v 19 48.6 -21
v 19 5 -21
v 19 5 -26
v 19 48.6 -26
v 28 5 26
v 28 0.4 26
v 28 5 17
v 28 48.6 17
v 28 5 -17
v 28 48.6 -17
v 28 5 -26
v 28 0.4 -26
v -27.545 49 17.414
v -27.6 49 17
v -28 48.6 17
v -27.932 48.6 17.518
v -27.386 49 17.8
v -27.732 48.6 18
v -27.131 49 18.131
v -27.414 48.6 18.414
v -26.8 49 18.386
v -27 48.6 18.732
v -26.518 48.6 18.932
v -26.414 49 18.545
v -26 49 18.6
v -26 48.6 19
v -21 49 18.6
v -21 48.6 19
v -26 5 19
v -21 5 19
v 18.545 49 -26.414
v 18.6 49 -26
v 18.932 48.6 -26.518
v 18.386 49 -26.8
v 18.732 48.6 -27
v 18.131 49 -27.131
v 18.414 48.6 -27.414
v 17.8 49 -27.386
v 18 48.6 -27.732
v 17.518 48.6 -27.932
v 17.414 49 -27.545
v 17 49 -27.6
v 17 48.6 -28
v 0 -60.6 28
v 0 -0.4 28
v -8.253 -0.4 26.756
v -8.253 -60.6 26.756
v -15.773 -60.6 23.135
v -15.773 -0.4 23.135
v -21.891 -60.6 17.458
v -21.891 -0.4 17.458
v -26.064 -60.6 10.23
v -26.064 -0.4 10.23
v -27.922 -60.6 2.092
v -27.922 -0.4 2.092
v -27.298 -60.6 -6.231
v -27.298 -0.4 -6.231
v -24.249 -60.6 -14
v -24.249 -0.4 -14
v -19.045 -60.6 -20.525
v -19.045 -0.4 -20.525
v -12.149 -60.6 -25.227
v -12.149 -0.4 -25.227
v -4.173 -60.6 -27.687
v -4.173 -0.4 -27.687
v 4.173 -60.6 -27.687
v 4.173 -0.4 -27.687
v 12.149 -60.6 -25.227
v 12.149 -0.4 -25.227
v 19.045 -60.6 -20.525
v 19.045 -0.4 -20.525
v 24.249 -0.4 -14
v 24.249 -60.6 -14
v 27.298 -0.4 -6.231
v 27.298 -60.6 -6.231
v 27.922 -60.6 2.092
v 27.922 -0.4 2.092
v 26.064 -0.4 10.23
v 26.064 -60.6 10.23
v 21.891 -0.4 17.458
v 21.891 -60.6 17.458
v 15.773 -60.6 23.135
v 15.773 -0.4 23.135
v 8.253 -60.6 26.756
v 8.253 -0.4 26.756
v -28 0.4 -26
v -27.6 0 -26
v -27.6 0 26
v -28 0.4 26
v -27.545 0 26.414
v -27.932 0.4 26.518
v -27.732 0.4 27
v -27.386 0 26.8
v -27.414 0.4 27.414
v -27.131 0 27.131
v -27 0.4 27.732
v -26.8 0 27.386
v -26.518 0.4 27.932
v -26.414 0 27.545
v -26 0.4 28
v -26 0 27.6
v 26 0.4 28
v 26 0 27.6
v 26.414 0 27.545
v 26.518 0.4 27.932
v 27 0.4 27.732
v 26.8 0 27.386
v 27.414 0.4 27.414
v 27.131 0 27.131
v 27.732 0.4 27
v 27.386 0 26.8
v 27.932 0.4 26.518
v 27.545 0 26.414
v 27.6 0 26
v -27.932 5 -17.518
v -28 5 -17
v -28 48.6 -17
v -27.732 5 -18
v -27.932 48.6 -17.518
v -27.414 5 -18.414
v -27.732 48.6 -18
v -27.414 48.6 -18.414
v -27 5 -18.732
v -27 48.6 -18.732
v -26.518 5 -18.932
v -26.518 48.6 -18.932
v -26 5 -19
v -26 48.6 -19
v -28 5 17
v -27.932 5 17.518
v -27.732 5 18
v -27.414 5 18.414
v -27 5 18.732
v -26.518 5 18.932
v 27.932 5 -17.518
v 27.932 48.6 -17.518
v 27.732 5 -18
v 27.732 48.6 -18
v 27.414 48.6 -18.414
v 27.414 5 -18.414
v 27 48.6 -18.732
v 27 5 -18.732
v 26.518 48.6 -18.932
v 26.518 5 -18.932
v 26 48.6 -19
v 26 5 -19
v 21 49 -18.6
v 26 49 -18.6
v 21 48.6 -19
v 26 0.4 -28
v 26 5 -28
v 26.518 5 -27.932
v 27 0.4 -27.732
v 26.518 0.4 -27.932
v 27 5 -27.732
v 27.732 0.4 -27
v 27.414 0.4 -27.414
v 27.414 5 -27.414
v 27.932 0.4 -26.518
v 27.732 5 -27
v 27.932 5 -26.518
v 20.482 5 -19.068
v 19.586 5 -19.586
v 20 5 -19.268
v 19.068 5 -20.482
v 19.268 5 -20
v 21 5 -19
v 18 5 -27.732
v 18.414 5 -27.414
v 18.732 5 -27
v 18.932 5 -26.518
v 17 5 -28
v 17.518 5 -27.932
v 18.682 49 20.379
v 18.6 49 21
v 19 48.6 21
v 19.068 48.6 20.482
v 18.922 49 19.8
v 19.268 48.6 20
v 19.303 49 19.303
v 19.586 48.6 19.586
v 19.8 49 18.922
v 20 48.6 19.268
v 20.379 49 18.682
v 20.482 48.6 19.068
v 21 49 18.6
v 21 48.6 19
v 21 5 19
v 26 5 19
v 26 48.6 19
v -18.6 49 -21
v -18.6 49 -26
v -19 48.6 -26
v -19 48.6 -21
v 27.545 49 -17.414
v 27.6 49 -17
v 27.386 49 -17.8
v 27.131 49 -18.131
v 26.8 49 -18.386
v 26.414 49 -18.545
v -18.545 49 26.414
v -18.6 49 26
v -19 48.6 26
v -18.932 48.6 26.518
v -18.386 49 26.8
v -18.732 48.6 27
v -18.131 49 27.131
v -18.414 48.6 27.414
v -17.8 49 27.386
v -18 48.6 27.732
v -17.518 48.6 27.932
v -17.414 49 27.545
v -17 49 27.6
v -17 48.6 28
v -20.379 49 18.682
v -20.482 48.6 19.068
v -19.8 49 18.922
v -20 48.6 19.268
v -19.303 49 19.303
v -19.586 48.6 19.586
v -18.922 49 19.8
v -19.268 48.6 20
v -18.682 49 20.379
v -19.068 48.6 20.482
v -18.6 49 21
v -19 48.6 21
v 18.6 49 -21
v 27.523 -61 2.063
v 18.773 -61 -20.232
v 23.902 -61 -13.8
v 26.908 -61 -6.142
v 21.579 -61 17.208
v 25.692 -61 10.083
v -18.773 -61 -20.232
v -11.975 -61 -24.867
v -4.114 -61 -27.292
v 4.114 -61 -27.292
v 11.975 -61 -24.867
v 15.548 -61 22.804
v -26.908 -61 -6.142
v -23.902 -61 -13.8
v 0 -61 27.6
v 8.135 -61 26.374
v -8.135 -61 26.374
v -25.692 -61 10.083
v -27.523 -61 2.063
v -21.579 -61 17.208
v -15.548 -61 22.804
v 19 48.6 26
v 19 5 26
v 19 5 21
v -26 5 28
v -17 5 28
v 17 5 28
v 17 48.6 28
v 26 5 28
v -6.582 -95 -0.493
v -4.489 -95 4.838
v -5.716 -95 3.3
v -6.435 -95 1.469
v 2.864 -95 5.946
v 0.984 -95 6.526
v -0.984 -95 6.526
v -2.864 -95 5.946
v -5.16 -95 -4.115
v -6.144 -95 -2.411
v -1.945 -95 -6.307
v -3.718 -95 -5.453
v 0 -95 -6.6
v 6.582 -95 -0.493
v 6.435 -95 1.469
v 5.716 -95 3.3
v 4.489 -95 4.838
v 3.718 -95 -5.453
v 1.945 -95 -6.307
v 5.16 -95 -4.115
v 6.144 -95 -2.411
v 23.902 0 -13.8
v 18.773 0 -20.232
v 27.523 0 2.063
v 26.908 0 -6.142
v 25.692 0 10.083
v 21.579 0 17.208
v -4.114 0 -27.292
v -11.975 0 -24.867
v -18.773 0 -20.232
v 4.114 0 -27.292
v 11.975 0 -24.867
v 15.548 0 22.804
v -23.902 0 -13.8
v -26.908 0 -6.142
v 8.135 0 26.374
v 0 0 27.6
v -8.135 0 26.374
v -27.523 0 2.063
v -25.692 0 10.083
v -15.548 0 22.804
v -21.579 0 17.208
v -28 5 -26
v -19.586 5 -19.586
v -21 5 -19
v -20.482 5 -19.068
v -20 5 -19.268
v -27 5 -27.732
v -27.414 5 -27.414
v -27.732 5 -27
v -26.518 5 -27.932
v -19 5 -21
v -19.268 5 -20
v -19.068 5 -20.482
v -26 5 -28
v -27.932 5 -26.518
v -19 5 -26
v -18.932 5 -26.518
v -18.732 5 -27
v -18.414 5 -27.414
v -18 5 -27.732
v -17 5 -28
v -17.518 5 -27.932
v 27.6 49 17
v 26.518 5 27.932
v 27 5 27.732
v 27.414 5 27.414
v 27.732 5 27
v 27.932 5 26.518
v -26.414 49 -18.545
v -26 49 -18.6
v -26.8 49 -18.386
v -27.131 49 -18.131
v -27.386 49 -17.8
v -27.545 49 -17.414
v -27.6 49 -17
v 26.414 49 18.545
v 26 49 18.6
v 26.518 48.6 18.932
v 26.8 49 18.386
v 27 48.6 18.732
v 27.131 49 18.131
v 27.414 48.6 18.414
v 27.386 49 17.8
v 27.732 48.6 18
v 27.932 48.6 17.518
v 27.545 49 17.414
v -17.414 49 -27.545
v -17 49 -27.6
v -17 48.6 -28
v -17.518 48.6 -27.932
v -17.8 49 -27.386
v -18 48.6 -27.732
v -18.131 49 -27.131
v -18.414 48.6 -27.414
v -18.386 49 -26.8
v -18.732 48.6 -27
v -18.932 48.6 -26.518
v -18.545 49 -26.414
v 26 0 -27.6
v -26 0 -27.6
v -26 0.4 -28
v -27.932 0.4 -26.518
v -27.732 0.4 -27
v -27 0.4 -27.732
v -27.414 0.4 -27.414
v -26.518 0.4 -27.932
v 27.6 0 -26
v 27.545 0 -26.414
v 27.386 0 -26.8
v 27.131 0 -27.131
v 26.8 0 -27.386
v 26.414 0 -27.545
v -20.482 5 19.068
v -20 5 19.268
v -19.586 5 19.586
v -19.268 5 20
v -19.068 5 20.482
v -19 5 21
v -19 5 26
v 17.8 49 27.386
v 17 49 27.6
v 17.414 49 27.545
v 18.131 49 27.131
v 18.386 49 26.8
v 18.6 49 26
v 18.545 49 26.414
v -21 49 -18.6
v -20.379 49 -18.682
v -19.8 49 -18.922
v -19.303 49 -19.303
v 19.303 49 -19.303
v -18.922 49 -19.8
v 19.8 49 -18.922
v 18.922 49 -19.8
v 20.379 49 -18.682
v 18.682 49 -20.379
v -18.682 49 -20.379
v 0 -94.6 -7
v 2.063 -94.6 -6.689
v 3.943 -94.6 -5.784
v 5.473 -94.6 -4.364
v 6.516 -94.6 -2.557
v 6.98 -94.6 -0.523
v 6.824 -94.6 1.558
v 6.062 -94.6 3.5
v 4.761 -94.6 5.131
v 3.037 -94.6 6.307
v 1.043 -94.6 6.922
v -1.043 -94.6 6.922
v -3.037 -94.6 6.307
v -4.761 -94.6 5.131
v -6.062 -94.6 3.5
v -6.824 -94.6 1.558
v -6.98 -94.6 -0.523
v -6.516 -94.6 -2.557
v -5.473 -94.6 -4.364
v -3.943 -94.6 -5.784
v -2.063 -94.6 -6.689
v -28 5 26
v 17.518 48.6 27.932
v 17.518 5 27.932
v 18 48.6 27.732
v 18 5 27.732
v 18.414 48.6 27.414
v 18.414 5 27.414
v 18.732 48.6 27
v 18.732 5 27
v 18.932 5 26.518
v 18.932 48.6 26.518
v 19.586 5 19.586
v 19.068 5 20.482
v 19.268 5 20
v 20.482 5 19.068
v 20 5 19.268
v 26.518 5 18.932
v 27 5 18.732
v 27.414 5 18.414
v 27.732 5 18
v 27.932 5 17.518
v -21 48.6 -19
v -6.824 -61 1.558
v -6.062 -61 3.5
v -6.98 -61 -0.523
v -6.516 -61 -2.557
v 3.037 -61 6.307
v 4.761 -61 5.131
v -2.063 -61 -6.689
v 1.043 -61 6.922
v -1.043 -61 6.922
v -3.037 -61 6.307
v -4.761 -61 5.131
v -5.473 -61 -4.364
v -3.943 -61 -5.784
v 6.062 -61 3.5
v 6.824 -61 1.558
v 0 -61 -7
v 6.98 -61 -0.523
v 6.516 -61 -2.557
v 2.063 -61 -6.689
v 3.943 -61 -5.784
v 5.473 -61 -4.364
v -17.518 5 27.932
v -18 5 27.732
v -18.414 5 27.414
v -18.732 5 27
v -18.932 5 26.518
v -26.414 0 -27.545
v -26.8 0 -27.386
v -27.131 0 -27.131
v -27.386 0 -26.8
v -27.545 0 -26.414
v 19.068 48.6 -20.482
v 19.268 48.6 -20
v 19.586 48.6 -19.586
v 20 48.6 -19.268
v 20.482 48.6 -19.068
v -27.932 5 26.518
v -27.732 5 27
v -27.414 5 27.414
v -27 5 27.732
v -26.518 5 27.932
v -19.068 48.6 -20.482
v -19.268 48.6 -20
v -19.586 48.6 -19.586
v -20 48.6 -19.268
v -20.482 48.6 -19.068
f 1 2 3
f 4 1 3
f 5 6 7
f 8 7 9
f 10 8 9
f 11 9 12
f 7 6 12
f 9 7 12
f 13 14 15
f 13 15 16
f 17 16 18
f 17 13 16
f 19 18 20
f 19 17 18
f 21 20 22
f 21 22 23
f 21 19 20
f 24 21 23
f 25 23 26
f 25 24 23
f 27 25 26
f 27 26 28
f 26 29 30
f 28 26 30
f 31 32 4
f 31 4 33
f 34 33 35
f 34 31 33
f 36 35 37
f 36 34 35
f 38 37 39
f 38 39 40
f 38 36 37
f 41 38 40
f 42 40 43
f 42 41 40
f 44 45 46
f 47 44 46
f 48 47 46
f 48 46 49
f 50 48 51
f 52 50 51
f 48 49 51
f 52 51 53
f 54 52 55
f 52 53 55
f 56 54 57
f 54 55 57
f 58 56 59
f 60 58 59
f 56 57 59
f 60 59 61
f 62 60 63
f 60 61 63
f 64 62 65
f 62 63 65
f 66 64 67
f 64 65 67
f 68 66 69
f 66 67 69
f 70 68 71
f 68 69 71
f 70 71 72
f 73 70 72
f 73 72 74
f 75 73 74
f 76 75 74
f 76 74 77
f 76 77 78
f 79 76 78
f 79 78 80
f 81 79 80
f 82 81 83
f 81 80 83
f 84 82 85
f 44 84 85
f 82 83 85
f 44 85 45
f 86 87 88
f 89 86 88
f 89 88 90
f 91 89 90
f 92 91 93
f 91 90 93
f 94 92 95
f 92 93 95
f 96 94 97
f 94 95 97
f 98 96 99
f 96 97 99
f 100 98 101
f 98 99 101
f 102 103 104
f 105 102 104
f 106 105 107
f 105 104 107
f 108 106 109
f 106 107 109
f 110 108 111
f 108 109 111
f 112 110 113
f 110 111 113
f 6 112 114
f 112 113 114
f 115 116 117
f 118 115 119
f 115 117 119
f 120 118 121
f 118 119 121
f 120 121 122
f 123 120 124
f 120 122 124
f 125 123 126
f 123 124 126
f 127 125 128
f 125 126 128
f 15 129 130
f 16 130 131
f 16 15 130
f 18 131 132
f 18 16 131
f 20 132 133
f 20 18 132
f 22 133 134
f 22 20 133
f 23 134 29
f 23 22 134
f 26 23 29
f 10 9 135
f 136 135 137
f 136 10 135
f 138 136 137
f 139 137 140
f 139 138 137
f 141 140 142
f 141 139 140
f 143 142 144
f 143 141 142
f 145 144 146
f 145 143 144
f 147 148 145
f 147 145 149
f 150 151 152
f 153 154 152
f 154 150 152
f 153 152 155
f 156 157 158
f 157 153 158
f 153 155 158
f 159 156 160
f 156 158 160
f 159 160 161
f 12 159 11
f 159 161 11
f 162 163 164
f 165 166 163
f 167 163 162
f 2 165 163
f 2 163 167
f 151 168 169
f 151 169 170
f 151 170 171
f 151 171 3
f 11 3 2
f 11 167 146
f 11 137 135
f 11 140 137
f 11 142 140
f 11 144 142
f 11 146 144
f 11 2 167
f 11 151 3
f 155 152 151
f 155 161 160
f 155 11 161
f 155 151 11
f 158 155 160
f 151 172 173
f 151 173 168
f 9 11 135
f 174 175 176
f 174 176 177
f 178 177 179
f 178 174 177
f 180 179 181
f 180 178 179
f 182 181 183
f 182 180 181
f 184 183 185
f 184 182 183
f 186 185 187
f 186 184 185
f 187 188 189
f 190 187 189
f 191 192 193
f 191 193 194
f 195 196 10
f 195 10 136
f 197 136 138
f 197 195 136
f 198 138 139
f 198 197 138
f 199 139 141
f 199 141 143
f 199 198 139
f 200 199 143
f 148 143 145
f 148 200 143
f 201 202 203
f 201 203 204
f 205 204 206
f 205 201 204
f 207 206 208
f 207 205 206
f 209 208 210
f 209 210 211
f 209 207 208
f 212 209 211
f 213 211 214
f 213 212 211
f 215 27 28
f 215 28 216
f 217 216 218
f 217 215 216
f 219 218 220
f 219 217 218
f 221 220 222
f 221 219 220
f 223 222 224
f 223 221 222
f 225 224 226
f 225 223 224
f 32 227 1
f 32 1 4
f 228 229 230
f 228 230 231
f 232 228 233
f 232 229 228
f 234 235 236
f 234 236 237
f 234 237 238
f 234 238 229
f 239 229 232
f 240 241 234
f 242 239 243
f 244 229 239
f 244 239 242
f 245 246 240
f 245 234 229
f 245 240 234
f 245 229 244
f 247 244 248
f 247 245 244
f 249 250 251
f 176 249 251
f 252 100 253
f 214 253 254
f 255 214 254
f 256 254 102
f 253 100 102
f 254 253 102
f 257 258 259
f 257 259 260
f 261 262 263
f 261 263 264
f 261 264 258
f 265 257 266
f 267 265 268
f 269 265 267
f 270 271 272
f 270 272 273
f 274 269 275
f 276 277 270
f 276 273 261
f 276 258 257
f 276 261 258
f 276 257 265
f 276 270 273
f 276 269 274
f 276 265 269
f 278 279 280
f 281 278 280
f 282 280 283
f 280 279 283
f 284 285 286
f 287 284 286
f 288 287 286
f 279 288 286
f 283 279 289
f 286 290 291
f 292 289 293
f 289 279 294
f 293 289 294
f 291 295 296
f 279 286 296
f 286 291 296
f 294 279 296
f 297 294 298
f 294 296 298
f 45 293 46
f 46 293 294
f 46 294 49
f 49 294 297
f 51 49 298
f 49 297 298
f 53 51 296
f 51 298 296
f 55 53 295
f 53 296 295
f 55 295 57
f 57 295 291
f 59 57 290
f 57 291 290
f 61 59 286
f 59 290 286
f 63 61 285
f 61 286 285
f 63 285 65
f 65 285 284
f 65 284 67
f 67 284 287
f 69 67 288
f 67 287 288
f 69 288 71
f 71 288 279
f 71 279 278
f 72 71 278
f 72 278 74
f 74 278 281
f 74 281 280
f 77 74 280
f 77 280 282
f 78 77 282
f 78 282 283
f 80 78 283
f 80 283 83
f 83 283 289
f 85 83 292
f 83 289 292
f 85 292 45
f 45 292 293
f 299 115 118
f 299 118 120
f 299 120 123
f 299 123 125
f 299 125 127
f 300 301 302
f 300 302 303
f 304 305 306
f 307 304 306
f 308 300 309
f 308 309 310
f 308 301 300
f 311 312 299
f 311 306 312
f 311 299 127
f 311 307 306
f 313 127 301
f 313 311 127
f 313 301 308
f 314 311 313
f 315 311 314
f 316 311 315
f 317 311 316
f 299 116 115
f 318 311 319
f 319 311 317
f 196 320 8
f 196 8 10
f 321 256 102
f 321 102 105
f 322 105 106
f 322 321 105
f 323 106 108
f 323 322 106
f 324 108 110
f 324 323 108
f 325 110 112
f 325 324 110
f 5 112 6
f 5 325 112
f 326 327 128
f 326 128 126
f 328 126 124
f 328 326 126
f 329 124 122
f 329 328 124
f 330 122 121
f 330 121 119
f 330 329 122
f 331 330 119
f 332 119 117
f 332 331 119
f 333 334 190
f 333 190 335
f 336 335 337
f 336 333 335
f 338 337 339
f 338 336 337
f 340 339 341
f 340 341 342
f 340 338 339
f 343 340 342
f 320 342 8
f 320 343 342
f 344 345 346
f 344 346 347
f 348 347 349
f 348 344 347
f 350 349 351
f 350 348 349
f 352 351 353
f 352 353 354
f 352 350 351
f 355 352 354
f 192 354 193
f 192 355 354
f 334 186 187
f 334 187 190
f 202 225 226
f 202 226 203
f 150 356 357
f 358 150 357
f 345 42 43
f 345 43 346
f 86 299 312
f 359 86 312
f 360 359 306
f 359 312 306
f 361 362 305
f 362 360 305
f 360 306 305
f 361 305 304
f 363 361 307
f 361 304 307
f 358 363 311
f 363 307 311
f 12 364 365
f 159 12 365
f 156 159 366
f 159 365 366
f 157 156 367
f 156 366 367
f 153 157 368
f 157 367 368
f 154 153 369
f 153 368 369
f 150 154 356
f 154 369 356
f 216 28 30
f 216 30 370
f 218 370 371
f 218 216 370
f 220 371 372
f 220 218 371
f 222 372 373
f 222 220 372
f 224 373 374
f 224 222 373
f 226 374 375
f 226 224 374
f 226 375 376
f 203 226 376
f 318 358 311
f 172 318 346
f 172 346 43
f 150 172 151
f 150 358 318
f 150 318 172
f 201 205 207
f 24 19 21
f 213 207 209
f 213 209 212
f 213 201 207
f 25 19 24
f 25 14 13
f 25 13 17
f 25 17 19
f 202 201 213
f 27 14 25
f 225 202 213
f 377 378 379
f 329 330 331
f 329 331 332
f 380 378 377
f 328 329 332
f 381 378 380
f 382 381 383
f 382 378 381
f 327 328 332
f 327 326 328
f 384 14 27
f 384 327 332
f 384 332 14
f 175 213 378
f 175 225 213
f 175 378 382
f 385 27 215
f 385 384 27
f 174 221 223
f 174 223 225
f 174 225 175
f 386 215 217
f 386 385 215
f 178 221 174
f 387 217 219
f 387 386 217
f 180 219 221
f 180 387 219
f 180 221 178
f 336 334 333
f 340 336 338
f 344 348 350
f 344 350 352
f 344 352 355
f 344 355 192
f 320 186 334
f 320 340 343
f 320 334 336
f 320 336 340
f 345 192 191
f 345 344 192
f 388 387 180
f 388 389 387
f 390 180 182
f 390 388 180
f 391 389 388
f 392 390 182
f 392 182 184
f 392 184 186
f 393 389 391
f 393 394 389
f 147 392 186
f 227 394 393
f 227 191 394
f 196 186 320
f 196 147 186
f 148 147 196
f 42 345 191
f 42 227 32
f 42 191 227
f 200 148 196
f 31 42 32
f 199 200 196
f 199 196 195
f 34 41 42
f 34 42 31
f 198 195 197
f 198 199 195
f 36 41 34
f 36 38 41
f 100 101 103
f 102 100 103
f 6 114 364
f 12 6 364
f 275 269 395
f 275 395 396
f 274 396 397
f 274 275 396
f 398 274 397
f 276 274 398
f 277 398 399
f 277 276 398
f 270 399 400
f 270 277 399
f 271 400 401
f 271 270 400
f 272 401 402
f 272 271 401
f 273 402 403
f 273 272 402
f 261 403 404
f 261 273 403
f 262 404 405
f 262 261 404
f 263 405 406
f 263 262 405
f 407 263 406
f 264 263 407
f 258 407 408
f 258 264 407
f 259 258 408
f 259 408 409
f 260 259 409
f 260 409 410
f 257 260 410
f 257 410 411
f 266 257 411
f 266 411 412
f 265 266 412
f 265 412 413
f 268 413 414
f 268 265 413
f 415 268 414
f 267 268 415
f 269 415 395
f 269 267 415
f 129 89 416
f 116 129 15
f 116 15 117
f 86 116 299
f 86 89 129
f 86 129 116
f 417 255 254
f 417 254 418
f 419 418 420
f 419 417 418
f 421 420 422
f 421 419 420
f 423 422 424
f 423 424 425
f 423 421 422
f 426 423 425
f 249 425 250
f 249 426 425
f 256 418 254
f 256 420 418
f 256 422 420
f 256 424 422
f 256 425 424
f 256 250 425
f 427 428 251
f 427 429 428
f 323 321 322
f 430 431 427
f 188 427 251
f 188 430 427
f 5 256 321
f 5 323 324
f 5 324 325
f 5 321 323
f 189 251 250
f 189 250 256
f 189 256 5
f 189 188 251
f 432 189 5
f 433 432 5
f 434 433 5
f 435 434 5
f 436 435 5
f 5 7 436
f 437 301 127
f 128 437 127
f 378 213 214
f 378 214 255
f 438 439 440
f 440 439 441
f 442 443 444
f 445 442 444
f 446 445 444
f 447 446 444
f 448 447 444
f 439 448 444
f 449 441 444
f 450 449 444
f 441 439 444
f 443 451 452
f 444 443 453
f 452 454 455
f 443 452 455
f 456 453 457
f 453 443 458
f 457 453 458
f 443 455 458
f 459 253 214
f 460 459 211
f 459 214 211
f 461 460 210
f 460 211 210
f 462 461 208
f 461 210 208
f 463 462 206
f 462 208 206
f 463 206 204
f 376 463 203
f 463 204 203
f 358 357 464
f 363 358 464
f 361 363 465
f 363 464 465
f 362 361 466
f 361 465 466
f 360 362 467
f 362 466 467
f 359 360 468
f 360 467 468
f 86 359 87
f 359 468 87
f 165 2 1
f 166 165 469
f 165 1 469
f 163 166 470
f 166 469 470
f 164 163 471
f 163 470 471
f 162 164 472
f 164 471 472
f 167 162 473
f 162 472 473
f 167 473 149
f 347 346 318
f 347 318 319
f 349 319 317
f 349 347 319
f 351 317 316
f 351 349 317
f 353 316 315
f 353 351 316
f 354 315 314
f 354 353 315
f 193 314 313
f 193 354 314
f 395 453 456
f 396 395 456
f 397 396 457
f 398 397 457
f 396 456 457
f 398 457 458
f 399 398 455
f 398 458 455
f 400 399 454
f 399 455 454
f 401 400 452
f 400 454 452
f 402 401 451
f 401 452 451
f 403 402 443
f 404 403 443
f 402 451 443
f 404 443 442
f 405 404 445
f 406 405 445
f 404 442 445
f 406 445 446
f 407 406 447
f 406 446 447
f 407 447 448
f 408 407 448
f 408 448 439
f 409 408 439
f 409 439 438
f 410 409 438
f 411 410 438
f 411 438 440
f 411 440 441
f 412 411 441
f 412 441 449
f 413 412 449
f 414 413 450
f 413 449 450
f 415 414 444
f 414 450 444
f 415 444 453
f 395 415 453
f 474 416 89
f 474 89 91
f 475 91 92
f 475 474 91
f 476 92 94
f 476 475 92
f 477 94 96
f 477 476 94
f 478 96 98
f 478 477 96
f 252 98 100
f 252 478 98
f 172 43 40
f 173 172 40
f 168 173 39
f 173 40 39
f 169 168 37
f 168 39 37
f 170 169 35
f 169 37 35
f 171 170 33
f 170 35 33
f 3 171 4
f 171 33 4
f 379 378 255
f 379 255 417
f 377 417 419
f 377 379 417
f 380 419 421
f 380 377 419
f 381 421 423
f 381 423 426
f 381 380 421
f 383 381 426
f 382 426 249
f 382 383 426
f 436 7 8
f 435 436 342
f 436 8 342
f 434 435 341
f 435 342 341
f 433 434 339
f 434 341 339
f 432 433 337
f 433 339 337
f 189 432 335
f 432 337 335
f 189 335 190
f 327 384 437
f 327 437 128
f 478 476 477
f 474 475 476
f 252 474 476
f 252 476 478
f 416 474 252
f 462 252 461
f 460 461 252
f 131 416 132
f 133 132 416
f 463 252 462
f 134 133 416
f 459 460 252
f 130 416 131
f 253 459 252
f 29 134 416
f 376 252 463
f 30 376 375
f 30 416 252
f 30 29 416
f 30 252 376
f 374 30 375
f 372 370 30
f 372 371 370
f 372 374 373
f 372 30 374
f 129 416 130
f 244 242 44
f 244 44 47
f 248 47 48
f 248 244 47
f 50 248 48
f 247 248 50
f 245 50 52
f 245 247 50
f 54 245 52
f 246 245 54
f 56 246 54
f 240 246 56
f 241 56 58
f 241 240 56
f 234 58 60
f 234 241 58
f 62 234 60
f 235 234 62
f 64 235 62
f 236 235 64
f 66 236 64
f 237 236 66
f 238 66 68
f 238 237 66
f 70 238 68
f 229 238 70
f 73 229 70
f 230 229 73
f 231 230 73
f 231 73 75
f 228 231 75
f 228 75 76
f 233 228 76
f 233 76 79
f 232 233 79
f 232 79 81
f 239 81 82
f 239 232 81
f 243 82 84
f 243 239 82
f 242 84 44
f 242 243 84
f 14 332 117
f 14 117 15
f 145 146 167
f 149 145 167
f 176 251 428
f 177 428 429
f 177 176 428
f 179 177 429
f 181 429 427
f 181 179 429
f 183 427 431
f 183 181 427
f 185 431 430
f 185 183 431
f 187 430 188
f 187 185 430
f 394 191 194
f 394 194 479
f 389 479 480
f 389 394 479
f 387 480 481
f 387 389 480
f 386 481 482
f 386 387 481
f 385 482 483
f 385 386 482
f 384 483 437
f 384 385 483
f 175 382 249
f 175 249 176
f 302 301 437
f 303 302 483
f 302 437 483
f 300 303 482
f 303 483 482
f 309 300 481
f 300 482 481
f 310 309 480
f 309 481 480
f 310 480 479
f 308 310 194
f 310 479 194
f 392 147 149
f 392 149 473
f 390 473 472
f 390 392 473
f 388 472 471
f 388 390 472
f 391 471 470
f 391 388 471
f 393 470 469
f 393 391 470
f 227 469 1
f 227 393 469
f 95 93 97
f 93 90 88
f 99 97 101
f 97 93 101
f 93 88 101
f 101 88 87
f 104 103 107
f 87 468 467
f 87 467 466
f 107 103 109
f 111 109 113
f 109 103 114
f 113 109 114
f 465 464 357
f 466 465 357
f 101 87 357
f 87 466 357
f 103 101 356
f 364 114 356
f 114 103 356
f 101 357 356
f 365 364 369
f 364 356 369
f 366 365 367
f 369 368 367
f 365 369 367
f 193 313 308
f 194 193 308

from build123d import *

# Parameters (mm, degrees)
SKETCH1_W           = 56
SKETCH1_H           = 56
BOSS_EXTRUDE1_DEPTH = 5
BOSS_EXTRUDE2_DEPTH = 44
FILLET1_R           = 2
CHAMFER1_SIZE       = 0.4
SKETCH3_R           = 28
BOSS_EXTRUDE3_DEPTH = 61
CHAMFER2_SIZE       = 0.4
SKETCH4_R           = 7
BOSS_EXTRUDE4_DEPTH = 34
CHAMFER3_SIZE       = 0.4


with BuildPart() as part:
    # Sketch1 → Boss-Extrude1 (new body)
    with BuildSketch(Plane(origin=(0, 0, 0), x_dir=(1, 0, 0), z_dir=(0, 1, 0))):
        Rectangle(SKETCH1_W, SKETCH1_H)
    extrude(amount=BOSS_EXTRUDE1_DEPTH)

    # Sketch2 → Boss-Extrude2 (add)
    with BuildSketch(Plane(origin=(0, 5, 0), x_dir=(1, 0, 0), z_dir=(0, 1, 0))):
        Polygon((-19, 19), (-28, 19), (-28, 0), (-28, -19), (-19, -19), (-19, -28), (19, -28), (19, -19), (28, -19), (28, 0), (28, 19), (19, 19), (19, 28), (-19, 28), align=None)
    extrude(amount=BOSS_EXTRUDE2_DEPTH)

    # Fillet1
    fillet1_edges = [part.edges().sort_by_distance(p)[0] for p in [
        (-28, 27, 19),
        (-19, 27, 19),
        (-19, 27, 28),
        (19, 27, 28),
        (19, 27, 19),
        (28, 27, 19),
        (28, 27, -19),
        (19, 27, -19),
        (19, 27, -28),
        (-19, 27, -28),
        (-19, 27, -19),
        (-28, 27, -19),
        (28, 2.5, 28),
        (-28, 2.5, 28),
        (-28, 2.5, -28),
        (28, 2.5, -28),
    ]]
    fillet(fillet1_edges, radius=FILLET1_R)

    # Chamfer1
    chamfer1_edges = [part.edges().sort_by_distance(p)[0] for p in [
        (-19.585786438, 49, 19.585786438),
        (19.585786438, 49, 19.585786438),
        (19.585786438, 49, -19.585786438),
        (-19.585786438, 49, -19.585786438),
        (0, 0, 28),
        (0, 49, 28),
        (28, 0, 0),
        (-28, 0, 0),
        (0, 0, -28),
        (-27.414213562, 0, -27.414213562),
        (27.414213562, 0, -27.414213562),
        (27.414213562, 0, 27.414213562),
        (-27.414213562, 0, 27.414213562),
        (-28, 49, 0),
        (-19, 49, 23.5),
        (-23.5, 49, 19),
        (19, 49, 23.5),
        (23.5, 49, 19),
        (28, 49, 0),
        (23.5, 49, -19),
        (19, 49, -23.5),
        (0, 49, -28),
        (-19, 49, -23.5),
        (-23.5, 49, -19),
        (-27.414213562, 49, -18.414213562),
        (-18.414213562, 49, -27.414213562),
        (18.414213562, 49, -27.414213562),
        (27.414213562, 49, -18.414213562),
        (27.414213562, 49, 18.414213562),
        (18.414213562, 49, 27.414213562),
        (-27.414213562, 49, 18.414213562),
        (-18.414213562, 49, 27.414213562),
    ]]
    chamfer(chamfer1_edges, length=CHAMFER1_SIZE)


with BuildPart() as body_2:
    # Sketch3 → Boss-Extrude3 (new body)
    with BuildSketch(Plane.XZ):
        with Locations(Location((0, 0, 0), (0, 0, 90))):
            Circle(SKETCH3_R)
    extrude(amount=BOSS_EXTRUDE3_DEPTH)

    # Chamfer2
    chamfer2_edges = [body_2.edges().sort_by_distance(p)[0] for p in [
        (0, 0, -28),
        (0, -61, -28),
    ]]
    chamfer(chamfer2_edges, length=CHAMFER2_SIZE)


with BuildPart() as body_3:
    # Sketch4 → Boss-Extrude4 (new body)
    with BuildSketch(Plane.XZ.offset(61)):
        with Locations(Location((0, 0, 0), (0, 0, 270))):
            Circle(SKETCH4_R)
    extrude(amount=BOSS_EXTRUDE4_DEPTH)

    # Chamfer3
    chamfer3_edges = [body_3.edges().sort_by_distance(p)[0] for p in [
        (0, -95, 7),
    ]]
    chamfer(chamfer3_edges, length=CHAMFER3_SIZE)


solid = Compound([part.part, body_2.part, body_3.part])
